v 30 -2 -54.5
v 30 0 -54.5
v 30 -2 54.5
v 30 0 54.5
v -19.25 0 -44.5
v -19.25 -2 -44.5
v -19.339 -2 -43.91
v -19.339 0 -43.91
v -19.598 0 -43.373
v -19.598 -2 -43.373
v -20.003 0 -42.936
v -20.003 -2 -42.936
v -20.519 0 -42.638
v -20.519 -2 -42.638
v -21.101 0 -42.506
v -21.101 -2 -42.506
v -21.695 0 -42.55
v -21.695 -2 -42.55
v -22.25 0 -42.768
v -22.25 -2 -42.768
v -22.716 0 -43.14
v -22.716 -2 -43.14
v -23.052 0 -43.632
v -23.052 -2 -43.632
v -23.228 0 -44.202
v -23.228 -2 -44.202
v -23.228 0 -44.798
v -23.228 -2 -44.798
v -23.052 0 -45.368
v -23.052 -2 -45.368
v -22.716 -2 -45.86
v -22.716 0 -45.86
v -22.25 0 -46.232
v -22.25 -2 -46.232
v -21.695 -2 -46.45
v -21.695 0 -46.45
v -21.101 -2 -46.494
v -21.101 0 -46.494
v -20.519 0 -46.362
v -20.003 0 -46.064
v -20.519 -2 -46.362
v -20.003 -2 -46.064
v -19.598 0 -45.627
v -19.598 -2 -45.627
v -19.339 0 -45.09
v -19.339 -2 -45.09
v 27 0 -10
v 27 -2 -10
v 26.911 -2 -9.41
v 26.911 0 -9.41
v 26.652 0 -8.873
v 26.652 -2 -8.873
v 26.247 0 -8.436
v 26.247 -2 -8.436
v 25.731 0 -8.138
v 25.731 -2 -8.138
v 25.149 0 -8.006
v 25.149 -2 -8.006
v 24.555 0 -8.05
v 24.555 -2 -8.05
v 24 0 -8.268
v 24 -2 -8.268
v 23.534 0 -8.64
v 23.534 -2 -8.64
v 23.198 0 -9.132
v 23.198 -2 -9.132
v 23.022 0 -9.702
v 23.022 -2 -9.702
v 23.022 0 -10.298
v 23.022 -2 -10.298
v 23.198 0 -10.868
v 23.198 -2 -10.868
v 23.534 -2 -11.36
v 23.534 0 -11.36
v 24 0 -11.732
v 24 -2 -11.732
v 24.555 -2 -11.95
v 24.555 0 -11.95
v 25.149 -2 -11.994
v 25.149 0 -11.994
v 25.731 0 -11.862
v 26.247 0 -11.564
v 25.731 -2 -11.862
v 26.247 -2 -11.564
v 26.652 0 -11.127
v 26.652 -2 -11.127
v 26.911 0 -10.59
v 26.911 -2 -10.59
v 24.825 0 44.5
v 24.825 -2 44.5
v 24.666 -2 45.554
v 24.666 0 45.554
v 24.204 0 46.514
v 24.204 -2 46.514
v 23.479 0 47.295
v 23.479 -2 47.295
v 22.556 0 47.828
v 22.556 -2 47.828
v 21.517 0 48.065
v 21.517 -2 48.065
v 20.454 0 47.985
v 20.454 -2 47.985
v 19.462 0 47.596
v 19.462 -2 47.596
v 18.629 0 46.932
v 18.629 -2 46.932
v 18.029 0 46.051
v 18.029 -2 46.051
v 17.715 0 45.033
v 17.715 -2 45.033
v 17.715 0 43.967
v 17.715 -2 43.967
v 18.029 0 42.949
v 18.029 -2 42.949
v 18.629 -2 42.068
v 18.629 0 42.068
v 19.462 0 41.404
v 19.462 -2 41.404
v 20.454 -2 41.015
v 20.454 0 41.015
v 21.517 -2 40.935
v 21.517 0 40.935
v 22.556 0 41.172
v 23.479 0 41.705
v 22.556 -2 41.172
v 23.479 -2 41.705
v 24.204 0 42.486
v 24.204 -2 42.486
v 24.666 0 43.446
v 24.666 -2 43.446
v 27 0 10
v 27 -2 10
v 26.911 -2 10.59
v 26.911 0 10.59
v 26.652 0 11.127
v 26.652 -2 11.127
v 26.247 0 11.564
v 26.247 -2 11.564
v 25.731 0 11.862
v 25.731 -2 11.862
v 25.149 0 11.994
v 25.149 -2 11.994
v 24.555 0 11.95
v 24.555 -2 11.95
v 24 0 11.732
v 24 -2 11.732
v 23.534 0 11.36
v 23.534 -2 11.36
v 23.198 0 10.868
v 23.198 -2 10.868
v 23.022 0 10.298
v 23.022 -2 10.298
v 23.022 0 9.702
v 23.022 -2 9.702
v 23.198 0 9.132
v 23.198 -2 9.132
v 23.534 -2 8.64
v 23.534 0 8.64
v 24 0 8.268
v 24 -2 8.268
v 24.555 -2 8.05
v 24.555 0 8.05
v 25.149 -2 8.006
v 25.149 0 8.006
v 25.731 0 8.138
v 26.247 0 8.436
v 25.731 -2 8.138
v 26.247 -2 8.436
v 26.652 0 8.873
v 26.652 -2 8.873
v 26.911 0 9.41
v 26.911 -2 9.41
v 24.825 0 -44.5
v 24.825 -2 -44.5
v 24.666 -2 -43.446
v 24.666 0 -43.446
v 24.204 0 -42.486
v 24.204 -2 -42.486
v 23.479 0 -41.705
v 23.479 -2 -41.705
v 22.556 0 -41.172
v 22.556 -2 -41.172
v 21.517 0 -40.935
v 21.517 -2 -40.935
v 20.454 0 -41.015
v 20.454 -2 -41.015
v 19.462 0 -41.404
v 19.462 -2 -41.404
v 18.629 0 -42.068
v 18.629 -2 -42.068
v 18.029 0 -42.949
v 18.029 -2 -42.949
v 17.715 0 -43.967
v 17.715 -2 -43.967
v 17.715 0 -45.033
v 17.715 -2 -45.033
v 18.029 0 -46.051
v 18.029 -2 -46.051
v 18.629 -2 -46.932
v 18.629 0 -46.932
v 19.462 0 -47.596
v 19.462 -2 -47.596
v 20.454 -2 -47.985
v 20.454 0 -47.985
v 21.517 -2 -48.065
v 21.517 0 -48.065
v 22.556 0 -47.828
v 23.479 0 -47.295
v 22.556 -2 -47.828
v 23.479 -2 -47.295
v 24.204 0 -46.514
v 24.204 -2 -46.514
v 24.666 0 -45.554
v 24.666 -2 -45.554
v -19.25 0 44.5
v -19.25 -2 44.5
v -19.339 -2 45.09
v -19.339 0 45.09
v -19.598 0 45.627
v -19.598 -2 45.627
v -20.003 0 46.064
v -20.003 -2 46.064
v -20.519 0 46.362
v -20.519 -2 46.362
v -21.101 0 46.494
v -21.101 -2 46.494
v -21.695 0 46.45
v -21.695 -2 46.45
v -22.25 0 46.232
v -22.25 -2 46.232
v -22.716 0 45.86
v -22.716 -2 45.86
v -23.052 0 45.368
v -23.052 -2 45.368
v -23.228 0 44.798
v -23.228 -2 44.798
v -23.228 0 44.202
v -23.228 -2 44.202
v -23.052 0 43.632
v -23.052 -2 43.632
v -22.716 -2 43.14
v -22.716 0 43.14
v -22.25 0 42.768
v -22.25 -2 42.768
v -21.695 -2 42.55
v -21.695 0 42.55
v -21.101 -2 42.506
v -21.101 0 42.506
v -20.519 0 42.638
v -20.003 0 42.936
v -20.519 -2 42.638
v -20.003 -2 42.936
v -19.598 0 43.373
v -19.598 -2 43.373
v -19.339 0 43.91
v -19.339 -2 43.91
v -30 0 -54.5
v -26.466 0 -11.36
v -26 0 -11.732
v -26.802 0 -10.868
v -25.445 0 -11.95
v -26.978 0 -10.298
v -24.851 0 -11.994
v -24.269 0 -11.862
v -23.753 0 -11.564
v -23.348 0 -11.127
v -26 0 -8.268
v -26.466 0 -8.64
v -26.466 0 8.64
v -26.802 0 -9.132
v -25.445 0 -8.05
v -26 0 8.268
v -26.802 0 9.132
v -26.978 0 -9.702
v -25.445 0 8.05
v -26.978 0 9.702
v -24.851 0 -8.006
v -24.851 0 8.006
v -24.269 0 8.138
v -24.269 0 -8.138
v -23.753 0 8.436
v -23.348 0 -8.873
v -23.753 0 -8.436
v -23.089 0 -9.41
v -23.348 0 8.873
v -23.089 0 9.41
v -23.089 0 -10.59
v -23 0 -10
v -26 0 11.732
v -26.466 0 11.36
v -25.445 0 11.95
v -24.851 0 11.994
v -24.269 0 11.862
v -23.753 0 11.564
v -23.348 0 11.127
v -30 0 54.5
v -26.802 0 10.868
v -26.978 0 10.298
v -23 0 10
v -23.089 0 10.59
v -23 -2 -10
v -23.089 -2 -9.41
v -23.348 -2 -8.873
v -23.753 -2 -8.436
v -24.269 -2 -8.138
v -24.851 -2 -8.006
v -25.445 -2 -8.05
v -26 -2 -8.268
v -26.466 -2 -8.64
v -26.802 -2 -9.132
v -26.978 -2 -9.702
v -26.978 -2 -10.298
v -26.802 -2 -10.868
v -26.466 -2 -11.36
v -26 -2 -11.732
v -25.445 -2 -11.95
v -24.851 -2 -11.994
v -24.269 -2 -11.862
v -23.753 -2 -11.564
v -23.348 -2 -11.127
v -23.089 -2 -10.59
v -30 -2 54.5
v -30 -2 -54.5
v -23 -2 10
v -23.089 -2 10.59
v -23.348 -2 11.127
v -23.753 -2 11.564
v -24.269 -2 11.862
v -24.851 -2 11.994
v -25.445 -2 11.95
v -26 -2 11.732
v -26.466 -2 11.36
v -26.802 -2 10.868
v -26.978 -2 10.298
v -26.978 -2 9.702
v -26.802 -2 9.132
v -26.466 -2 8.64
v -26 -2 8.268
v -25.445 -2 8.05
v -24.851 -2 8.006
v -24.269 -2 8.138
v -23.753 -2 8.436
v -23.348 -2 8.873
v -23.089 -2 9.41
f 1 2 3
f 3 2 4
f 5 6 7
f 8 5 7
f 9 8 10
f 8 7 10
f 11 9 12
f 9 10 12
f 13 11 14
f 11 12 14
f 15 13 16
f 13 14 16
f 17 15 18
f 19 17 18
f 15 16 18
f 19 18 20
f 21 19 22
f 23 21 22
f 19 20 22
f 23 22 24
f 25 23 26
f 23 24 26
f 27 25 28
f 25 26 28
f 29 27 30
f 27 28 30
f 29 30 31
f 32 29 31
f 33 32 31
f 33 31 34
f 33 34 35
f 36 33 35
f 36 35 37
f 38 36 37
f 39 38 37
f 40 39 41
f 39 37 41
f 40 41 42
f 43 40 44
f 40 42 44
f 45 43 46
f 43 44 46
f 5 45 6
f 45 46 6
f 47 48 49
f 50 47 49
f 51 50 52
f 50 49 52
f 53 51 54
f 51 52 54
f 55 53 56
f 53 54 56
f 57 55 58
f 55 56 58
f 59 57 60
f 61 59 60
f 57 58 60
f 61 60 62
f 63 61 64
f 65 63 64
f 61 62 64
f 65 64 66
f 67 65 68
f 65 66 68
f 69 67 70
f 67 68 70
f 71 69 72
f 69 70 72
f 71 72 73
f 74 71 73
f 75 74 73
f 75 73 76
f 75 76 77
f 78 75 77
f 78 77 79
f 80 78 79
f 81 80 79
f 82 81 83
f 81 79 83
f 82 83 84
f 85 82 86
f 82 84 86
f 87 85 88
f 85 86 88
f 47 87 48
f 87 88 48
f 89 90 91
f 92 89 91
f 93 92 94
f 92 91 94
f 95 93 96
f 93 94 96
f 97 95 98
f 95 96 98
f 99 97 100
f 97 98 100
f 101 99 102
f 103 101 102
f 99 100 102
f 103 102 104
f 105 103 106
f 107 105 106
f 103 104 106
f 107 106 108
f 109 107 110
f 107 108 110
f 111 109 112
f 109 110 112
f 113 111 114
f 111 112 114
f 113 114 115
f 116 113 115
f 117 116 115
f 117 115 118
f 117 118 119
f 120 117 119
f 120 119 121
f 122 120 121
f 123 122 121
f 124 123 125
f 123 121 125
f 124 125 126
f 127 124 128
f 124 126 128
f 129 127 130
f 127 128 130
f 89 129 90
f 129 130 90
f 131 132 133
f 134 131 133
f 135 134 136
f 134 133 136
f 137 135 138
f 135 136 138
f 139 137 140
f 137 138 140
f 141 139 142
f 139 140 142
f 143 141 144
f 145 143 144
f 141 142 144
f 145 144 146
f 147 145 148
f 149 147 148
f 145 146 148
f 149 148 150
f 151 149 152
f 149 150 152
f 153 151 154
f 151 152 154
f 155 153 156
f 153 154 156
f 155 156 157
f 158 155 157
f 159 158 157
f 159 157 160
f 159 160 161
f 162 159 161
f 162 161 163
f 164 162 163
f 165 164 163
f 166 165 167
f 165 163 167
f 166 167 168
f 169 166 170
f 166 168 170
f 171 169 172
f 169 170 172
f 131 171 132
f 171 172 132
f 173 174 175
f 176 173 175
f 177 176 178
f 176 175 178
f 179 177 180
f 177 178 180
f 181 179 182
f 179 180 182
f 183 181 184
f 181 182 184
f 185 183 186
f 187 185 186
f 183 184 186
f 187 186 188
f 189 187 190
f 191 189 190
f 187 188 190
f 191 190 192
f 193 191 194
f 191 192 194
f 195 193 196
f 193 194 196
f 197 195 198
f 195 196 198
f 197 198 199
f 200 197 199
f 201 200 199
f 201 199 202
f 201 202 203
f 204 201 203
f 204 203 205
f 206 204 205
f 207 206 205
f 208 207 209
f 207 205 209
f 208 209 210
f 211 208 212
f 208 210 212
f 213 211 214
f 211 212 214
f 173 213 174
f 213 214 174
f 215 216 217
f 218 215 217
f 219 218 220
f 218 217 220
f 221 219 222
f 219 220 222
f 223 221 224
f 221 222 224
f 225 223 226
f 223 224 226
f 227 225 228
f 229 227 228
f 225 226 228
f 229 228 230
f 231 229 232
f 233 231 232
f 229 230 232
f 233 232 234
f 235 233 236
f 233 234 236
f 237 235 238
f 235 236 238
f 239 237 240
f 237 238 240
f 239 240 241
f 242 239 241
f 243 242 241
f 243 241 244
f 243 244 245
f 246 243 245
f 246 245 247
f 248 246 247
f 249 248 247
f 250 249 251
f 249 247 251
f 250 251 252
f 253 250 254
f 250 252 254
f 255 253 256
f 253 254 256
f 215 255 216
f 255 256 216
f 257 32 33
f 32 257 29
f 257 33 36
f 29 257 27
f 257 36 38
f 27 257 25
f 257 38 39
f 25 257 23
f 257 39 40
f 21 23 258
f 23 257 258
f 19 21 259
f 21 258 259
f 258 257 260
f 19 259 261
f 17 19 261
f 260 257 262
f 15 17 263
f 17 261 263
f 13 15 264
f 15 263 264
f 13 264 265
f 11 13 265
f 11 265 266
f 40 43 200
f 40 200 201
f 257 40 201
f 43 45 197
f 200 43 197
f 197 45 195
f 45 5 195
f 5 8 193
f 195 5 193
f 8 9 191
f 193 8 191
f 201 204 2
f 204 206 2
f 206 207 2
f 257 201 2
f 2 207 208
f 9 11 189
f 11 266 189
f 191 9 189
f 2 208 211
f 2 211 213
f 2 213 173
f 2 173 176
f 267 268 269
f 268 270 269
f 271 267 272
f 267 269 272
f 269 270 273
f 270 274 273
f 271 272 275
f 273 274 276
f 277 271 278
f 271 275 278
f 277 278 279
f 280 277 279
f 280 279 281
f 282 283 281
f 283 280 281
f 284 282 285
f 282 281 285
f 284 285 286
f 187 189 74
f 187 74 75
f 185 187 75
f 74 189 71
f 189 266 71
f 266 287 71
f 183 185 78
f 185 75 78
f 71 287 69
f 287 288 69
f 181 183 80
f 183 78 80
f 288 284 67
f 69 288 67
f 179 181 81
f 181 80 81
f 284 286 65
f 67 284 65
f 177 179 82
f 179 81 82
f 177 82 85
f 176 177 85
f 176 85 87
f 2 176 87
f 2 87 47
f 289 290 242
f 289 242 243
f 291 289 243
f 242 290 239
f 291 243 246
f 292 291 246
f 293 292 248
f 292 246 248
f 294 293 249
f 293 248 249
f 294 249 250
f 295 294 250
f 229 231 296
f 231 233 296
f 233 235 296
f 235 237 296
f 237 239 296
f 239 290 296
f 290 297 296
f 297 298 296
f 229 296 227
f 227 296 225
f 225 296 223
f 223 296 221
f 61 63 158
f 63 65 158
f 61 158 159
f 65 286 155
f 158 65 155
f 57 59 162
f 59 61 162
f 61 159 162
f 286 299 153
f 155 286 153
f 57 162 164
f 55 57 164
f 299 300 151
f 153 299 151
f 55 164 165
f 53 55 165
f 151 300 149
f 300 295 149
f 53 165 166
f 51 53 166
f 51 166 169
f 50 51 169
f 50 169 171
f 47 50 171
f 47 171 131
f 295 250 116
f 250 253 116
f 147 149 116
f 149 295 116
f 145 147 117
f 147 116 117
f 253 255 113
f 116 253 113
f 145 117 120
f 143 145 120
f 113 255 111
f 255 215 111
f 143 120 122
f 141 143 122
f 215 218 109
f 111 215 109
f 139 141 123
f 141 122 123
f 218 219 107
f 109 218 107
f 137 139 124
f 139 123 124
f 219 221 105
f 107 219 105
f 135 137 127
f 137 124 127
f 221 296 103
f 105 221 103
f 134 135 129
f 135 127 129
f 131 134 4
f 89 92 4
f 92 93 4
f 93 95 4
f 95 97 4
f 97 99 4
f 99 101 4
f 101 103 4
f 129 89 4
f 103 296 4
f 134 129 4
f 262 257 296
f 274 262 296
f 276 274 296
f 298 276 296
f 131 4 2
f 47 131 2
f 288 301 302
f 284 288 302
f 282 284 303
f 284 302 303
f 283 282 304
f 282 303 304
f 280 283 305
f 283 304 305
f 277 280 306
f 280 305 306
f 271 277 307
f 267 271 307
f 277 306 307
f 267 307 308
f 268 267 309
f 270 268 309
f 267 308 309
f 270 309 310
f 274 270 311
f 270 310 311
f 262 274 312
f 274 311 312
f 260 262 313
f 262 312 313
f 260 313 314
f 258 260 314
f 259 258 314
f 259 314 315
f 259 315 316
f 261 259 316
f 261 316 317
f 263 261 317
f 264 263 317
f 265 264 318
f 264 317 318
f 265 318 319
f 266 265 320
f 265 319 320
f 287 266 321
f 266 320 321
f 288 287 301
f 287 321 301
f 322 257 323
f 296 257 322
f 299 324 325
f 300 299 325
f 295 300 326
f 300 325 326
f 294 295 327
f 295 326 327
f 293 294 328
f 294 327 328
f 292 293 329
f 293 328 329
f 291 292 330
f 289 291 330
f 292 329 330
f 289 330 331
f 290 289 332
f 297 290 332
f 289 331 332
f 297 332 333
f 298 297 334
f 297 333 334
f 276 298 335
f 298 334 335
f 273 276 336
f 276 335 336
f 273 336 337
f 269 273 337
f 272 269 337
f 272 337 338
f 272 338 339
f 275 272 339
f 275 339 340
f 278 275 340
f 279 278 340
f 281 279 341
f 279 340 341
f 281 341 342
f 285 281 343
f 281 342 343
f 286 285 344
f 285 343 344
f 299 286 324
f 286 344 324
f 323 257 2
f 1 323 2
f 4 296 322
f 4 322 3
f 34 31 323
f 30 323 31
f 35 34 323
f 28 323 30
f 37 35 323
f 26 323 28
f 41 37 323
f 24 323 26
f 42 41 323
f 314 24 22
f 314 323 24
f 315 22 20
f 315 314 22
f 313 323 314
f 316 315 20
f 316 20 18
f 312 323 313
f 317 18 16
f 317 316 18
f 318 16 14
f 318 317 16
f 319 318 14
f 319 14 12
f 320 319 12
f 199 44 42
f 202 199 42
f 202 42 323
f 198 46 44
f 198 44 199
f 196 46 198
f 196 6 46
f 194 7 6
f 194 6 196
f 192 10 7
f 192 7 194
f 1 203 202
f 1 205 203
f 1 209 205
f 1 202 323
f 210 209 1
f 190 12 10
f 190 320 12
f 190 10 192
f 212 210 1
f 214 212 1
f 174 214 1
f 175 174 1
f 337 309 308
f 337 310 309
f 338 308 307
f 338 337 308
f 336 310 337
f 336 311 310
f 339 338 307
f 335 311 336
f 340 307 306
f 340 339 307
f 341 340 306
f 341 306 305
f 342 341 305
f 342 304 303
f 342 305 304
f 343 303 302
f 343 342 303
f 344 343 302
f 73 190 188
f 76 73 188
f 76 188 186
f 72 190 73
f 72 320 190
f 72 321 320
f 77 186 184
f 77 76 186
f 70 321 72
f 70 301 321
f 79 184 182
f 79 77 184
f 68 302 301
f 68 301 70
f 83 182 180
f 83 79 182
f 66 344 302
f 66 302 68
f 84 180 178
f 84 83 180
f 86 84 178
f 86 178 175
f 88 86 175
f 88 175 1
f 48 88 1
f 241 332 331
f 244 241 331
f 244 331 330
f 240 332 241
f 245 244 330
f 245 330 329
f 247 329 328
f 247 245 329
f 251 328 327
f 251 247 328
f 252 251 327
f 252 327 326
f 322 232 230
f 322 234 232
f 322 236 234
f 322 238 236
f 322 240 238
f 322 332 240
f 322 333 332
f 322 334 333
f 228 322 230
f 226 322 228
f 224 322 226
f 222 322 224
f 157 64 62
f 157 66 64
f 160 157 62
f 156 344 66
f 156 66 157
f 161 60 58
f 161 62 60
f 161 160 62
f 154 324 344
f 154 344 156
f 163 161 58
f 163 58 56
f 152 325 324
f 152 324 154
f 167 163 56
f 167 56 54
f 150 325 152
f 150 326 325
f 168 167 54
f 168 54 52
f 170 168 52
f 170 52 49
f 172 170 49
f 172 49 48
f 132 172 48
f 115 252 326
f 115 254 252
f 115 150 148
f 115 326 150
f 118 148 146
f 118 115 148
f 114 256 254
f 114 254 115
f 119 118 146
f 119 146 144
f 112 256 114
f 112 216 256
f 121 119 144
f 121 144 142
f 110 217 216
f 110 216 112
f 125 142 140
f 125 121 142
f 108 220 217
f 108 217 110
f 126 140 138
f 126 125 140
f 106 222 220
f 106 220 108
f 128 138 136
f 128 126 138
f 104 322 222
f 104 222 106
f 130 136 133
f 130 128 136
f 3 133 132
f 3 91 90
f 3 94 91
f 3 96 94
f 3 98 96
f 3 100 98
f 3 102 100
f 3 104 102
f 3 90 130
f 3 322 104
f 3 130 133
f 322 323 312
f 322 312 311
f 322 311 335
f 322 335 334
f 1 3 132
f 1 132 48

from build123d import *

# Parameters (mm, degrees)
F0_W     = 60
F0_H     = 109
F1_DEPTH = 2
F2_R     = 2
F2_R_2   = 3.575
F3_DEPTH = 2
F4_R     = 2
F5_DEPTH = 2


with BuildPart() as f1:
    # F0 (on Front) → F1 (new body)
    with BuildSketch(Plane.XZ):
        Rectangle(F0_W, F0_H)
    extrude(amount=F1_DEPTH)

    # F2 (on face) → F3 (cut, through all)
    with BuildSketch(Plane.XZ.offset(2)):
        with Locations((-21.25, 44.5)):
            Circle(F2_R)
        with Locations((-21.25, -44.5)):
            Circle(F2_R)
        with Locations((21.25, 44.5)):
            Circle(F2_R_2)
        with Locations((21.25, -44.5)):
            Circle(F2_R_2)
    extrude(amount=-F3_DEPTH, mode=Mode.SUBTRACT)

    # F4 (on face) → F5 (cut, through all)
    with BuildSketch(Plane.XZ.offset(2)):
        with Locations((-25, 10)):
            Circle(F4_R)
        with Locations((25, 10)):
            Circle(F4_R)
        with Locations((-25, -10)):
            Circle(F4_R)
        with Locations((25, -10)):
            Circle(F4_R)
    extrude(amount=-F5_DEPTH, mode=Mode.SUBTRACT)


solid = f1.part
